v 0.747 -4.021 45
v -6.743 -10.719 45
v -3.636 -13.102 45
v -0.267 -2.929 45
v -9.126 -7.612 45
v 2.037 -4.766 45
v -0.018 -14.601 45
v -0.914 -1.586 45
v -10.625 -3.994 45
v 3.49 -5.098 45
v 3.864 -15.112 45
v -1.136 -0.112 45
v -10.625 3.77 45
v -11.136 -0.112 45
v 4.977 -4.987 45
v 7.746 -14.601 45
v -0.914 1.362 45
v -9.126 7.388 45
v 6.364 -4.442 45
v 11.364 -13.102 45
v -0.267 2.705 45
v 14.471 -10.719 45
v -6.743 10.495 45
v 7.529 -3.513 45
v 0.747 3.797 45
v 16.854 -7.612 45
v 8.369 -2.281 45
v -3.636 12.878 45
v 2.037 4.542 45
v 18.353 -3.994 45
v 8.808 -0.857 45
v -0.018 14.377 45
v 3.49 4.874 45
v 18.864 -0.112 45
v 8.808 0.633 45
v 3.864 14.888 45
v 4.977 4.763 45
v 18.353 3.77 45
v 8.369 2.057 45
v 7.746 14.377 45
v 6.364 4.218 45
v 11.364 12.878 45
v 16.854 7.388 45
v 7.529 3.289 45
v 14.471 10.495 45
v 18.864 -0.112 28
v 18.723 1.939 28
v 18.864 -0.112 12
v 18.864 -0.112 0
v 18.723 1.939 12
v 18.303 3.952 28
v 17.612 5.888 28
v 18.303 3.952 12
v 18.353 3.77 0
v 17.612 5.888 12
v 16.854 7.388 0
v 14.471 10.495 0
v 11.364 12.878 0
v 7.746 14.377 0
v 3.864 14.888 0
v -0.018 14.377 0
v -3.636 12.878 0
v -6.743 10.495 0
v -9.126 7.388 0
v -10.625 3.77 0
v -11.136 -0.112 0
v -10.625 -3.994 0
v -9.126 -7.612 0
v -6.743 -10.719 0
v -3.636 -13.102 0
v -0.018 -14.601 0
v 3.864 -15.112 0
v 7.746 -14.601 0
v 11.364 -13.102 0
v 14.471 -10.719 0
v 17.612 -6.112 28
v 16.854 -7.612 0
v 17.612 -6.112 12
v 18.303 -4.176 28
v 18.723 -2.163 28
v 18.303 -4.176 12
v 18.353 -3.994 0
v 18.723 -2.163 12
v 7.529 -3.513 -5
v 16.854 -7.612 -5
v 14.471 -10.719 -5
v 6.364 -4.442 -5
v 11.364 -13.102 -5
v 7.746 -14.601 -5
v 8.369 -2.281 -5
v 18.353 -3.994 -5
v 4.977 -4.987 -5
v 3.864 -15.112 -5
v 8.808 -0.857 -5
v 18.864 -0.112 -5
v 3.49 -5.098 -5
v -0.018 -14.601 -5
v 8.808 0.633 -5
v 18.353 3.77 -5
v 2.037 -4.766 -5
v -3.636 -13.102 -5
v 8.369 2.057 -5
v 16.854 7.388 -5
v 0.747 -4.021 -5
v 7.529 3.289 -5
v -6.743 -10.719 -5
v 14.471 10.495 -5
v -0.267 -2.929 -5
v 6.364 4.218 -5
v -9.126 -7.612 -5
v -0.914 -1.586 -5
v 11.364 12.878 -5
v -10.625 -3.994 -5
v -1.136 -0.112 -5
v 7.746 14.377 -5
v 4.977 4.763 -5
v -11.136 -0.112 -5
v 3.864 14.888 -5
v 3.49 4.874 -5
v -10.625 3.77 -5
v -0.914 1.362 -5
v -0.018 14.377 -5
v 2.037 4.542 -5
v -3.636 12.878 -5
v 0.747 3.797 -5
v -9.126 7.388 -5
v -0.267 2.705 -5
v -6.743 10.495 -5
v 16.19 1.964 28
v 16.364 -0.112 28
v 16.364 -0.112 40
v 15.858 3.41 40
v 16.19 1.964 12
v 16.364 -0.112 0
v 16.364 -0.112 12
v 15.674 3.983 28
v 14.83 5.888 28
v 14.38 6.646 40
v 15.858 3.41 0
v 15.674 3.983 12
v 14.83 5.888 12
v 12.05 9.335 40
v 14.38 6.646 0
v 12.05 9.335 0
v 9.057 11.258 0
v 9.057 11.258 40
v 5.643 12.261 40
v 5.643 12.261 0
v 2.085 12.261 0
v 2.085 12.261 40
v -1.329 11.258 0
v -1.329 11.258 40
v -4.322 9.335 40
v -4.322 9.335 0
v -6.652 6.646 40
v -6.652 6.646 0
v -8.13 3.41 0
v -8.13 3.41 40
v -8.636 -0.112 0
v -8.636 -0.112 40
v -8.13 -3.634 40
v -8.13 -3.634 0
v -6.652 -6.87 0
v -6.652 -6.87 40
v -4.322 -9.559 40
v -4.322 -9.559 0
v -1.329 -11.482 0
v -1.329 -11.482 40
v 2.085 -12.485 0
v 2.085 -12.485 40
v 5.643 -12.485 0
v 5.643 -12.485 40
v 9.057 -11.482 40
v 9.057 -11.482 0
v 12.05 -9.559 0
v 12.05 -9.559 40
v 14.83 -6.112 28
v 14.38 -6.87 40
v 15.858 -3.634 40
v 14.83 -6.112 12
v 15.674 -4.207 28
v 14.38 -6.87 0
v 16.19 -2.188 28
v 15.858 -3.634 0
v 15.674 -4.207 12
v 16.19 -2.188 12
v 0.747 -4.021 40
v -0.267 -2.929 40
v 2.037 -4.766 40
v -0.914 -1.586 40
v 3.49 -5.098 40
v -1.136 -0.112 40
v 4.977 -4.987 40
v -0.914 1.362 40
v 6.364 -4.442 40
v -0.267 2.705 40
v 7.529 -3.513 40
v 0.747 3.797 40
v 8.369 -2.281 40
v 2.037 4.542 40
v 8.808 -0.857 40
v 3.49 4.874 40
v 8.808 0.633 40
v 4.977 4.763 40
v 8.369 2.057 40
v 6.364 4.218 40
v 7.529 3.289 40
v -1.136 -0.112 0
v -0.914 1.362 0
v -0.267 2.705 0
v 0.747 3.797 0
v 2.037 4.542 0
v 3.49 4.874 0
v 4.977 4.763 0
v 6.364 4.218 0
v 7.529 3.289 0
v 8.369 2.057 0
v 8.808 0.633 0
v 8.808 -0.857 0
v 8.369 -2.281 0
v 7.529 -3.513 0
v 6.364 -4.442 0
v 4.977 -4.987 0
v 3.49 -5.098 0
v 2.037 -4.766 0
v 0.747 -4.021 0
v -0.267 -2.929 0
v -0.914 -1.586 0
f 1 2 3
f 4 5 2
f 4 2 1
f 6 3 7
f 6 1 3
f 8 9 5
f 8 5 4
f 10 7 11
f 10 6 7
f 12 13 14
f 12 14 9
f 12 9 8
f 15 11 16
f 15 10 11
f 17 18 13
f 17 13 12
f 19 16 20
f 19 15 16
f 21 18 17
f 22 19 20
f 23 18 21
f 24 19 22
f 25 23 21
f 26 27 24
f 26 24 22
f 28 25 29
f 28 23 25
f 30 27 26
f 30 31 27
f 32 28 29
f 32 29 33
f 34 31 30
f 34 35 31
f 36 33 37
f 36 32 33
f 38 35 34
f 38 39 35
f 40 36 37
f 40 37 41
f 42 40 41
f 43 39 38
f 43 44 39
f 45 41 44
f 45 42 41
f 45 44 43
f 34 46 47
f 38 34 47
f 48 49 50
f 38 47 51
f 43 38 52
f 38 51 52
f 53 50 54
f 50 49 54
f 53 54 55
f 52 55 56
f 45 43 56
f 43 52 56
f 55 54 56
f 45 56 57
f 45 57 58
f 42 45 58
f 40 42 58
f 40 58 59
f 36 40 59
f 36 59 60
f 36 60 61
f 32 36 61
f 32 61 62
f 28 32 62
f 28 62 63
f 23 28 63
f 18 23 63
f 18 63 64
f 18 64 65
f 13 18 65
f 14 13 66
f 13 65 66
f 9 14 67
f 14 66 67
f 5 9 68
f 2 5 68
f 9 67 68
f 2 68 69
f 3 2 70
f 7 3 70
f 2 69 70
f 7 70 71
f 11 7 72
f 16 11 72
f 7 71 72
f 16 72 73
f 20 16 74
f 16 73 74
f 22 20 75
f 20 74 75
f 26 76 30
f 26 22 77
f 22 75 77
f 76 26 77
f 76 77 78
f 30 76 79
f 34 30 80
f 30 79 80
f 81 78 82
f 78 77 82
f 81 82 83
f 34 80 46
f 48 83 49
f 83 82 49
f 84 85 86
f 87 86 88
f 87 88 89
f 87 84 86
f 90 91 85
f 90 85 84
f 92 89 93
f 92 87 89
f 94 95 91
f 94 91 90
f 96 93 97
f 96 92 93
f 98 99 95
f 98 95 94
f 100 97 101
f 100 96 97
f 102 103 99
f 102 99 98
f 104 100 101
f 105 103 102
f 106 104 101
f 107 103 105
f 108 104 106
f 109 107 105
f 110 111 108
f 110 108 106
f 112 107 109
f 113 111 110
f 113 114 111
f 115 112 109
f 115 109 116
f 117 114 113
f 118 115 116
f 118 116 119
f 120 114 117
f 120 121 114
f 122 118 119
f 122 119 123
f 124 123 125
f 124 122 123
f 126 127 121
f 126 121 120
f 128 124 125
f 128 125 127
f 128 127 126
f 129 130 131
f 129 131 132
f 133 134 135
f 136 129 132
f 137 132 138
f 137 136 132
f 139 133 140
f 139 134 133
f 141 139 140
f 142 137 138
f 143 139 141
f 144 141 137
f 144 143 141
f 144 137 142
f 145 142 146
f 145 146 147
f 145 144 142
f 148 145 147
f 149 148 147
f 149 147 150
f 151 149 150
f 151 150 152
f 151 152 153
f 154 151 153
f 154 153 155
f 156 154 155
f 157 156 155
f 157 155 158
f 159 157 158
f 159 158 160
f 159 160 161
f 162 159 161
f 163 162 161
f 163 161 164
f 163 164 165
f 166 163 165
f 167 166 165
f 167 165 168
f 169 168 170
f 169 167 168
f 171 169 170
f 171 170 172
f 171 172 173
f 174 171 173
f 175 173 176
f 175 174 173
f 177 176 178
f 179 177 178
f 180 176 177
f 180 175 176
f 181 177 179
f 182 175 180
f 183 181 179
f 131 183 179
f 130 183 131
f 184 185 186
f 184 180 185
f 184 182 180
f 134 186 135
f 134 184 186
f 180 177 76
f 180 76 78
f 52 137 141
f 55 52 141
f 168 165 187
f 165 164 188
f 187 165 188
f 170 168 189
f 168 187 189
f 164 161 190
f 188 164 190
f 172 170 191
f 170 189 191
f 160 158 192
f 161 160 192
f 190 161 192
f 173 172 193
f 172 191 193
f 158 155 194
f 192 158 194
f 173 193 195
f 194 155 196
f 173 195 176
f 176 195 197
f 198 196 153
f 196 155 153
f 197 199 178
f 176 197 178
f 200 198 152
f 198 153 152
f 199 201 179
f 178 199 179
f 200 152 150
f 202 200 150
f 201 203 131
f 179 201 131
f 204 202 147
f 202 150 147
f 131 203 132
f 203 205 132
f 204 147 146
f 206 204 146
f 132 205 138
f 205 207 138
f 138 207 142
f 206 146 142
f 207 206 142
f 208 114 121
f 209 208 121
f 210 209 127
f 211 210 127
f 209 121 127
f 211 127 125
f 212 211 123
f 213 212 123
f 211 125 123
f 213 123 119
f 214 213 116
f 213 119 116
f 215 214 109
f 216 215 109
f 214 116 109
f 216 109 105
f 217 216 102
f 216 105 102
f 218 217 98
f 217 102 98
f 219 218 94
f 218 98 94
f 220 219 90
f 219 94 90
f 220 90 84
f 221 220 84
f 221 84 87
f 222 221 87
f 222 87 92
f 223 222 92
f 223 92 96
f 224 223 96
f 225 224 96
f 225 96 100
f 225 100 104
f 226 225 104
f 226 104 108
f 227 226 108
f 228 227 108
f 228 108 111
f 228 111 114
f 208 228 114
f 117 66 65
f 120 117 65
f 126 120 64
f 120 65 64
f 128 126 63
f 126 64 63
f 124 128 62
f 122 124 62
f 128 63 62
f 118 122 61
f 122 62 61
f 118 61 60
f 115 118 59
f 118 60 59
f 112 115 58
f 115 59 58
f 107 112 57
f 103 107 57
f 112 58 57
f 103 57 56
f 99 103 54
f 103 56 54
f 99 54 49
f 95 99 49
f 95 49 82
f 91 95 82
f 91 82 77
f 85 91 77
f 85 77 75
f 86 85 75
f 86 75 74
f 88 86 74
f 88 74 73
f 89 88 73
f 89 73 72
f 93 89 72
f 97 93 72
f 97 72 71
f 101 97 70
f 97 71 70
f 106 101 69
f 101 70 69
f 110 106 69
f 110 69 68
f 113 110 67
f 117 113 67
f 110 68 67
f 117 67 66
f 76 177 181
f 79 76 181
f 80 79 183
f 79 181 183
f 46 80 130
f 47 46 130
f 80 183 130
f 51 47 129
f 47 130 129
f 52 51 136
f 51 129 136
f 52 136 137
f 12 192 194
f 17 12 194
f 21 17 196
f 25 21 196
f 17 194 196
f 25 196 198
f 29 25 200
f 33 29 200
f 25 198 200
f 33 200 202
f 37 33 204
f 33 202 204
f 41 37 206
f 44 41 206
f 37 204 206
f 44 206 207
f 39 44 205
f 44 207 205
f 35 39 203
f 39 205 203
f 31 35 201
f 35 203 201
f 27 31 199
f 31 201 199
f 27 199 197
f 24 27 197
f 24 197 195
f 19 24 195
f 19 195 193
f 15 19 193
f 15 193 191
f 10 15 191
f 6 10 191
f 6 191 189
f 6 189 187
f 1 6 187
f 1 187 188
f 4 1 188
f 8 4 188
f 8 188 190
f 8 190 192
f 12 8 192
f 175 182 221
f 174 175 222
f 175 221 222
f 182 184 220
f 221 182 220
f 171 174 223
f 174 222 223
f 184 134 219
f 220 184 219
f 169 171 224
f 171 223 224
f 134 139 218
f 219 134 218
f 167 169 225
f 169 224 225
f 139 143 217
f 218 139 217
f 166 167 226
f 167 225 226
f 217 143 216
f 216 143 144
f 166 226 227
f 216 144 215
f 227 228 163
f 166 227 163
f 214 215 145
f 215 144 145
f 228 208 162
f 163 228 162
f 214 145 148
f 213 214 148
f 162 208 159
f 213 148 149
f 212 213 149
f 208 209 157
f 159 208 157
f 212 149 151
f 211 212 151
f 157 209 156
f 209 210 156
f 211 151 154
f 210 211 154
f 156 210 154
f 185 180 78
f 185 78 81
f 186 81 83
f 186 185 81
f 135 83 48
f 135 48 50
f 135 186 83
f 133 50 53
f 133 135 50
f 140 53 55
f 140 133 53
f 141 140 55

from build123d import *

# Parameters (mm, degrees)
SKETCH1_R           = 15
SKETCH1_R_2         = 12.5
BOSS_EXTRUDE1_DEPTH = 40
SKETCH2_R           = 15
BOSS_EXTRUDE2_DEPTH = 5
BOSS_EXTRUDE3_START = 5
SKETCH3_R           = 15
BOSS_EXTRUDE3_DEPTH = 5
SKETCH4_R           = 5
BOSS_EXTRUDE4_DEPTH = 160
SKETCH5_W           = 16
SKETCH5_H           = 12
CUT_EXTRUDE1_DEPTH  = 160


with BuildPart() as part:
    # Sketch1 → Boss-Extrude1 (new body)
    with BuildSketch(Plane.XY):
        with Locations((3.864023938, -0.112000694)):
            Circle(SKETCH1_R)
        with Locations((3.864023938, -0.112000694)):
            Circle(SKETCH1_R_2, mode=Mode.SUBTRACT)
    extrude(amount=BOSS_EXTRUDE1_DEPTH)

    # Sketch2 → Boss-Extrude2 (add)
    with BuildSketch(Plane.XY.offset(40)):
        with Locations((3.864023938, -0.112000694)):
            Circle(SKETCH2_R)
    extrude(amount=BOSS_EXTRUDE2_DEPTH)

    # Sketch3 → Boss-Extrude3 (add)
    with BuildSketch(Plane(origin=(0, 0, 0), x_dir=(-1, 0, 0), z_dir=(0, 0, -1)).offset(BOSS_EXTRUDE3_START)):
        with Locations((-3.864023938, -0.112000694)):
            Circle(SKETCH3_R)
    extrude(amount=-BOSS_EXTRUDE3_DEPTH)


with BuildPart() as body_2:
    # Sketch4 → Boss-Extrude4 (new body)
    with BuildSketch(Plane(origin=(0, 0, -5), x_dir=(-1, 0, 0), z_dir=(0, 0, -1))):
        with Locations((-3.864023938, -0.112000694)):
            Circle(SKETCH4_R)
    extrude(amount=-BOSS_EXTRUDE4_DEPTH)


with BuildPart() as part_1:
    add(part.part)

    # Combine1: cut body 2
    add(body_2.part, mode=Mode.SUBTRACT)

    # Sketch5 → Cut-Extrude1 (cut)
    with BuildSketch(Plane(origin=(0, 0, 0), x_dir=(0, 0, -1), z_dir=(1, 0, 0))):
        with Locations((-20, -0.112000694)):
            Rectangle(SKETCH5_W, SKETCH5_H)
    extrude(amount=CUT_EXTRUDE1_DEPTH, mode=Mode.SUBTRACT)


solid = part_1.part
